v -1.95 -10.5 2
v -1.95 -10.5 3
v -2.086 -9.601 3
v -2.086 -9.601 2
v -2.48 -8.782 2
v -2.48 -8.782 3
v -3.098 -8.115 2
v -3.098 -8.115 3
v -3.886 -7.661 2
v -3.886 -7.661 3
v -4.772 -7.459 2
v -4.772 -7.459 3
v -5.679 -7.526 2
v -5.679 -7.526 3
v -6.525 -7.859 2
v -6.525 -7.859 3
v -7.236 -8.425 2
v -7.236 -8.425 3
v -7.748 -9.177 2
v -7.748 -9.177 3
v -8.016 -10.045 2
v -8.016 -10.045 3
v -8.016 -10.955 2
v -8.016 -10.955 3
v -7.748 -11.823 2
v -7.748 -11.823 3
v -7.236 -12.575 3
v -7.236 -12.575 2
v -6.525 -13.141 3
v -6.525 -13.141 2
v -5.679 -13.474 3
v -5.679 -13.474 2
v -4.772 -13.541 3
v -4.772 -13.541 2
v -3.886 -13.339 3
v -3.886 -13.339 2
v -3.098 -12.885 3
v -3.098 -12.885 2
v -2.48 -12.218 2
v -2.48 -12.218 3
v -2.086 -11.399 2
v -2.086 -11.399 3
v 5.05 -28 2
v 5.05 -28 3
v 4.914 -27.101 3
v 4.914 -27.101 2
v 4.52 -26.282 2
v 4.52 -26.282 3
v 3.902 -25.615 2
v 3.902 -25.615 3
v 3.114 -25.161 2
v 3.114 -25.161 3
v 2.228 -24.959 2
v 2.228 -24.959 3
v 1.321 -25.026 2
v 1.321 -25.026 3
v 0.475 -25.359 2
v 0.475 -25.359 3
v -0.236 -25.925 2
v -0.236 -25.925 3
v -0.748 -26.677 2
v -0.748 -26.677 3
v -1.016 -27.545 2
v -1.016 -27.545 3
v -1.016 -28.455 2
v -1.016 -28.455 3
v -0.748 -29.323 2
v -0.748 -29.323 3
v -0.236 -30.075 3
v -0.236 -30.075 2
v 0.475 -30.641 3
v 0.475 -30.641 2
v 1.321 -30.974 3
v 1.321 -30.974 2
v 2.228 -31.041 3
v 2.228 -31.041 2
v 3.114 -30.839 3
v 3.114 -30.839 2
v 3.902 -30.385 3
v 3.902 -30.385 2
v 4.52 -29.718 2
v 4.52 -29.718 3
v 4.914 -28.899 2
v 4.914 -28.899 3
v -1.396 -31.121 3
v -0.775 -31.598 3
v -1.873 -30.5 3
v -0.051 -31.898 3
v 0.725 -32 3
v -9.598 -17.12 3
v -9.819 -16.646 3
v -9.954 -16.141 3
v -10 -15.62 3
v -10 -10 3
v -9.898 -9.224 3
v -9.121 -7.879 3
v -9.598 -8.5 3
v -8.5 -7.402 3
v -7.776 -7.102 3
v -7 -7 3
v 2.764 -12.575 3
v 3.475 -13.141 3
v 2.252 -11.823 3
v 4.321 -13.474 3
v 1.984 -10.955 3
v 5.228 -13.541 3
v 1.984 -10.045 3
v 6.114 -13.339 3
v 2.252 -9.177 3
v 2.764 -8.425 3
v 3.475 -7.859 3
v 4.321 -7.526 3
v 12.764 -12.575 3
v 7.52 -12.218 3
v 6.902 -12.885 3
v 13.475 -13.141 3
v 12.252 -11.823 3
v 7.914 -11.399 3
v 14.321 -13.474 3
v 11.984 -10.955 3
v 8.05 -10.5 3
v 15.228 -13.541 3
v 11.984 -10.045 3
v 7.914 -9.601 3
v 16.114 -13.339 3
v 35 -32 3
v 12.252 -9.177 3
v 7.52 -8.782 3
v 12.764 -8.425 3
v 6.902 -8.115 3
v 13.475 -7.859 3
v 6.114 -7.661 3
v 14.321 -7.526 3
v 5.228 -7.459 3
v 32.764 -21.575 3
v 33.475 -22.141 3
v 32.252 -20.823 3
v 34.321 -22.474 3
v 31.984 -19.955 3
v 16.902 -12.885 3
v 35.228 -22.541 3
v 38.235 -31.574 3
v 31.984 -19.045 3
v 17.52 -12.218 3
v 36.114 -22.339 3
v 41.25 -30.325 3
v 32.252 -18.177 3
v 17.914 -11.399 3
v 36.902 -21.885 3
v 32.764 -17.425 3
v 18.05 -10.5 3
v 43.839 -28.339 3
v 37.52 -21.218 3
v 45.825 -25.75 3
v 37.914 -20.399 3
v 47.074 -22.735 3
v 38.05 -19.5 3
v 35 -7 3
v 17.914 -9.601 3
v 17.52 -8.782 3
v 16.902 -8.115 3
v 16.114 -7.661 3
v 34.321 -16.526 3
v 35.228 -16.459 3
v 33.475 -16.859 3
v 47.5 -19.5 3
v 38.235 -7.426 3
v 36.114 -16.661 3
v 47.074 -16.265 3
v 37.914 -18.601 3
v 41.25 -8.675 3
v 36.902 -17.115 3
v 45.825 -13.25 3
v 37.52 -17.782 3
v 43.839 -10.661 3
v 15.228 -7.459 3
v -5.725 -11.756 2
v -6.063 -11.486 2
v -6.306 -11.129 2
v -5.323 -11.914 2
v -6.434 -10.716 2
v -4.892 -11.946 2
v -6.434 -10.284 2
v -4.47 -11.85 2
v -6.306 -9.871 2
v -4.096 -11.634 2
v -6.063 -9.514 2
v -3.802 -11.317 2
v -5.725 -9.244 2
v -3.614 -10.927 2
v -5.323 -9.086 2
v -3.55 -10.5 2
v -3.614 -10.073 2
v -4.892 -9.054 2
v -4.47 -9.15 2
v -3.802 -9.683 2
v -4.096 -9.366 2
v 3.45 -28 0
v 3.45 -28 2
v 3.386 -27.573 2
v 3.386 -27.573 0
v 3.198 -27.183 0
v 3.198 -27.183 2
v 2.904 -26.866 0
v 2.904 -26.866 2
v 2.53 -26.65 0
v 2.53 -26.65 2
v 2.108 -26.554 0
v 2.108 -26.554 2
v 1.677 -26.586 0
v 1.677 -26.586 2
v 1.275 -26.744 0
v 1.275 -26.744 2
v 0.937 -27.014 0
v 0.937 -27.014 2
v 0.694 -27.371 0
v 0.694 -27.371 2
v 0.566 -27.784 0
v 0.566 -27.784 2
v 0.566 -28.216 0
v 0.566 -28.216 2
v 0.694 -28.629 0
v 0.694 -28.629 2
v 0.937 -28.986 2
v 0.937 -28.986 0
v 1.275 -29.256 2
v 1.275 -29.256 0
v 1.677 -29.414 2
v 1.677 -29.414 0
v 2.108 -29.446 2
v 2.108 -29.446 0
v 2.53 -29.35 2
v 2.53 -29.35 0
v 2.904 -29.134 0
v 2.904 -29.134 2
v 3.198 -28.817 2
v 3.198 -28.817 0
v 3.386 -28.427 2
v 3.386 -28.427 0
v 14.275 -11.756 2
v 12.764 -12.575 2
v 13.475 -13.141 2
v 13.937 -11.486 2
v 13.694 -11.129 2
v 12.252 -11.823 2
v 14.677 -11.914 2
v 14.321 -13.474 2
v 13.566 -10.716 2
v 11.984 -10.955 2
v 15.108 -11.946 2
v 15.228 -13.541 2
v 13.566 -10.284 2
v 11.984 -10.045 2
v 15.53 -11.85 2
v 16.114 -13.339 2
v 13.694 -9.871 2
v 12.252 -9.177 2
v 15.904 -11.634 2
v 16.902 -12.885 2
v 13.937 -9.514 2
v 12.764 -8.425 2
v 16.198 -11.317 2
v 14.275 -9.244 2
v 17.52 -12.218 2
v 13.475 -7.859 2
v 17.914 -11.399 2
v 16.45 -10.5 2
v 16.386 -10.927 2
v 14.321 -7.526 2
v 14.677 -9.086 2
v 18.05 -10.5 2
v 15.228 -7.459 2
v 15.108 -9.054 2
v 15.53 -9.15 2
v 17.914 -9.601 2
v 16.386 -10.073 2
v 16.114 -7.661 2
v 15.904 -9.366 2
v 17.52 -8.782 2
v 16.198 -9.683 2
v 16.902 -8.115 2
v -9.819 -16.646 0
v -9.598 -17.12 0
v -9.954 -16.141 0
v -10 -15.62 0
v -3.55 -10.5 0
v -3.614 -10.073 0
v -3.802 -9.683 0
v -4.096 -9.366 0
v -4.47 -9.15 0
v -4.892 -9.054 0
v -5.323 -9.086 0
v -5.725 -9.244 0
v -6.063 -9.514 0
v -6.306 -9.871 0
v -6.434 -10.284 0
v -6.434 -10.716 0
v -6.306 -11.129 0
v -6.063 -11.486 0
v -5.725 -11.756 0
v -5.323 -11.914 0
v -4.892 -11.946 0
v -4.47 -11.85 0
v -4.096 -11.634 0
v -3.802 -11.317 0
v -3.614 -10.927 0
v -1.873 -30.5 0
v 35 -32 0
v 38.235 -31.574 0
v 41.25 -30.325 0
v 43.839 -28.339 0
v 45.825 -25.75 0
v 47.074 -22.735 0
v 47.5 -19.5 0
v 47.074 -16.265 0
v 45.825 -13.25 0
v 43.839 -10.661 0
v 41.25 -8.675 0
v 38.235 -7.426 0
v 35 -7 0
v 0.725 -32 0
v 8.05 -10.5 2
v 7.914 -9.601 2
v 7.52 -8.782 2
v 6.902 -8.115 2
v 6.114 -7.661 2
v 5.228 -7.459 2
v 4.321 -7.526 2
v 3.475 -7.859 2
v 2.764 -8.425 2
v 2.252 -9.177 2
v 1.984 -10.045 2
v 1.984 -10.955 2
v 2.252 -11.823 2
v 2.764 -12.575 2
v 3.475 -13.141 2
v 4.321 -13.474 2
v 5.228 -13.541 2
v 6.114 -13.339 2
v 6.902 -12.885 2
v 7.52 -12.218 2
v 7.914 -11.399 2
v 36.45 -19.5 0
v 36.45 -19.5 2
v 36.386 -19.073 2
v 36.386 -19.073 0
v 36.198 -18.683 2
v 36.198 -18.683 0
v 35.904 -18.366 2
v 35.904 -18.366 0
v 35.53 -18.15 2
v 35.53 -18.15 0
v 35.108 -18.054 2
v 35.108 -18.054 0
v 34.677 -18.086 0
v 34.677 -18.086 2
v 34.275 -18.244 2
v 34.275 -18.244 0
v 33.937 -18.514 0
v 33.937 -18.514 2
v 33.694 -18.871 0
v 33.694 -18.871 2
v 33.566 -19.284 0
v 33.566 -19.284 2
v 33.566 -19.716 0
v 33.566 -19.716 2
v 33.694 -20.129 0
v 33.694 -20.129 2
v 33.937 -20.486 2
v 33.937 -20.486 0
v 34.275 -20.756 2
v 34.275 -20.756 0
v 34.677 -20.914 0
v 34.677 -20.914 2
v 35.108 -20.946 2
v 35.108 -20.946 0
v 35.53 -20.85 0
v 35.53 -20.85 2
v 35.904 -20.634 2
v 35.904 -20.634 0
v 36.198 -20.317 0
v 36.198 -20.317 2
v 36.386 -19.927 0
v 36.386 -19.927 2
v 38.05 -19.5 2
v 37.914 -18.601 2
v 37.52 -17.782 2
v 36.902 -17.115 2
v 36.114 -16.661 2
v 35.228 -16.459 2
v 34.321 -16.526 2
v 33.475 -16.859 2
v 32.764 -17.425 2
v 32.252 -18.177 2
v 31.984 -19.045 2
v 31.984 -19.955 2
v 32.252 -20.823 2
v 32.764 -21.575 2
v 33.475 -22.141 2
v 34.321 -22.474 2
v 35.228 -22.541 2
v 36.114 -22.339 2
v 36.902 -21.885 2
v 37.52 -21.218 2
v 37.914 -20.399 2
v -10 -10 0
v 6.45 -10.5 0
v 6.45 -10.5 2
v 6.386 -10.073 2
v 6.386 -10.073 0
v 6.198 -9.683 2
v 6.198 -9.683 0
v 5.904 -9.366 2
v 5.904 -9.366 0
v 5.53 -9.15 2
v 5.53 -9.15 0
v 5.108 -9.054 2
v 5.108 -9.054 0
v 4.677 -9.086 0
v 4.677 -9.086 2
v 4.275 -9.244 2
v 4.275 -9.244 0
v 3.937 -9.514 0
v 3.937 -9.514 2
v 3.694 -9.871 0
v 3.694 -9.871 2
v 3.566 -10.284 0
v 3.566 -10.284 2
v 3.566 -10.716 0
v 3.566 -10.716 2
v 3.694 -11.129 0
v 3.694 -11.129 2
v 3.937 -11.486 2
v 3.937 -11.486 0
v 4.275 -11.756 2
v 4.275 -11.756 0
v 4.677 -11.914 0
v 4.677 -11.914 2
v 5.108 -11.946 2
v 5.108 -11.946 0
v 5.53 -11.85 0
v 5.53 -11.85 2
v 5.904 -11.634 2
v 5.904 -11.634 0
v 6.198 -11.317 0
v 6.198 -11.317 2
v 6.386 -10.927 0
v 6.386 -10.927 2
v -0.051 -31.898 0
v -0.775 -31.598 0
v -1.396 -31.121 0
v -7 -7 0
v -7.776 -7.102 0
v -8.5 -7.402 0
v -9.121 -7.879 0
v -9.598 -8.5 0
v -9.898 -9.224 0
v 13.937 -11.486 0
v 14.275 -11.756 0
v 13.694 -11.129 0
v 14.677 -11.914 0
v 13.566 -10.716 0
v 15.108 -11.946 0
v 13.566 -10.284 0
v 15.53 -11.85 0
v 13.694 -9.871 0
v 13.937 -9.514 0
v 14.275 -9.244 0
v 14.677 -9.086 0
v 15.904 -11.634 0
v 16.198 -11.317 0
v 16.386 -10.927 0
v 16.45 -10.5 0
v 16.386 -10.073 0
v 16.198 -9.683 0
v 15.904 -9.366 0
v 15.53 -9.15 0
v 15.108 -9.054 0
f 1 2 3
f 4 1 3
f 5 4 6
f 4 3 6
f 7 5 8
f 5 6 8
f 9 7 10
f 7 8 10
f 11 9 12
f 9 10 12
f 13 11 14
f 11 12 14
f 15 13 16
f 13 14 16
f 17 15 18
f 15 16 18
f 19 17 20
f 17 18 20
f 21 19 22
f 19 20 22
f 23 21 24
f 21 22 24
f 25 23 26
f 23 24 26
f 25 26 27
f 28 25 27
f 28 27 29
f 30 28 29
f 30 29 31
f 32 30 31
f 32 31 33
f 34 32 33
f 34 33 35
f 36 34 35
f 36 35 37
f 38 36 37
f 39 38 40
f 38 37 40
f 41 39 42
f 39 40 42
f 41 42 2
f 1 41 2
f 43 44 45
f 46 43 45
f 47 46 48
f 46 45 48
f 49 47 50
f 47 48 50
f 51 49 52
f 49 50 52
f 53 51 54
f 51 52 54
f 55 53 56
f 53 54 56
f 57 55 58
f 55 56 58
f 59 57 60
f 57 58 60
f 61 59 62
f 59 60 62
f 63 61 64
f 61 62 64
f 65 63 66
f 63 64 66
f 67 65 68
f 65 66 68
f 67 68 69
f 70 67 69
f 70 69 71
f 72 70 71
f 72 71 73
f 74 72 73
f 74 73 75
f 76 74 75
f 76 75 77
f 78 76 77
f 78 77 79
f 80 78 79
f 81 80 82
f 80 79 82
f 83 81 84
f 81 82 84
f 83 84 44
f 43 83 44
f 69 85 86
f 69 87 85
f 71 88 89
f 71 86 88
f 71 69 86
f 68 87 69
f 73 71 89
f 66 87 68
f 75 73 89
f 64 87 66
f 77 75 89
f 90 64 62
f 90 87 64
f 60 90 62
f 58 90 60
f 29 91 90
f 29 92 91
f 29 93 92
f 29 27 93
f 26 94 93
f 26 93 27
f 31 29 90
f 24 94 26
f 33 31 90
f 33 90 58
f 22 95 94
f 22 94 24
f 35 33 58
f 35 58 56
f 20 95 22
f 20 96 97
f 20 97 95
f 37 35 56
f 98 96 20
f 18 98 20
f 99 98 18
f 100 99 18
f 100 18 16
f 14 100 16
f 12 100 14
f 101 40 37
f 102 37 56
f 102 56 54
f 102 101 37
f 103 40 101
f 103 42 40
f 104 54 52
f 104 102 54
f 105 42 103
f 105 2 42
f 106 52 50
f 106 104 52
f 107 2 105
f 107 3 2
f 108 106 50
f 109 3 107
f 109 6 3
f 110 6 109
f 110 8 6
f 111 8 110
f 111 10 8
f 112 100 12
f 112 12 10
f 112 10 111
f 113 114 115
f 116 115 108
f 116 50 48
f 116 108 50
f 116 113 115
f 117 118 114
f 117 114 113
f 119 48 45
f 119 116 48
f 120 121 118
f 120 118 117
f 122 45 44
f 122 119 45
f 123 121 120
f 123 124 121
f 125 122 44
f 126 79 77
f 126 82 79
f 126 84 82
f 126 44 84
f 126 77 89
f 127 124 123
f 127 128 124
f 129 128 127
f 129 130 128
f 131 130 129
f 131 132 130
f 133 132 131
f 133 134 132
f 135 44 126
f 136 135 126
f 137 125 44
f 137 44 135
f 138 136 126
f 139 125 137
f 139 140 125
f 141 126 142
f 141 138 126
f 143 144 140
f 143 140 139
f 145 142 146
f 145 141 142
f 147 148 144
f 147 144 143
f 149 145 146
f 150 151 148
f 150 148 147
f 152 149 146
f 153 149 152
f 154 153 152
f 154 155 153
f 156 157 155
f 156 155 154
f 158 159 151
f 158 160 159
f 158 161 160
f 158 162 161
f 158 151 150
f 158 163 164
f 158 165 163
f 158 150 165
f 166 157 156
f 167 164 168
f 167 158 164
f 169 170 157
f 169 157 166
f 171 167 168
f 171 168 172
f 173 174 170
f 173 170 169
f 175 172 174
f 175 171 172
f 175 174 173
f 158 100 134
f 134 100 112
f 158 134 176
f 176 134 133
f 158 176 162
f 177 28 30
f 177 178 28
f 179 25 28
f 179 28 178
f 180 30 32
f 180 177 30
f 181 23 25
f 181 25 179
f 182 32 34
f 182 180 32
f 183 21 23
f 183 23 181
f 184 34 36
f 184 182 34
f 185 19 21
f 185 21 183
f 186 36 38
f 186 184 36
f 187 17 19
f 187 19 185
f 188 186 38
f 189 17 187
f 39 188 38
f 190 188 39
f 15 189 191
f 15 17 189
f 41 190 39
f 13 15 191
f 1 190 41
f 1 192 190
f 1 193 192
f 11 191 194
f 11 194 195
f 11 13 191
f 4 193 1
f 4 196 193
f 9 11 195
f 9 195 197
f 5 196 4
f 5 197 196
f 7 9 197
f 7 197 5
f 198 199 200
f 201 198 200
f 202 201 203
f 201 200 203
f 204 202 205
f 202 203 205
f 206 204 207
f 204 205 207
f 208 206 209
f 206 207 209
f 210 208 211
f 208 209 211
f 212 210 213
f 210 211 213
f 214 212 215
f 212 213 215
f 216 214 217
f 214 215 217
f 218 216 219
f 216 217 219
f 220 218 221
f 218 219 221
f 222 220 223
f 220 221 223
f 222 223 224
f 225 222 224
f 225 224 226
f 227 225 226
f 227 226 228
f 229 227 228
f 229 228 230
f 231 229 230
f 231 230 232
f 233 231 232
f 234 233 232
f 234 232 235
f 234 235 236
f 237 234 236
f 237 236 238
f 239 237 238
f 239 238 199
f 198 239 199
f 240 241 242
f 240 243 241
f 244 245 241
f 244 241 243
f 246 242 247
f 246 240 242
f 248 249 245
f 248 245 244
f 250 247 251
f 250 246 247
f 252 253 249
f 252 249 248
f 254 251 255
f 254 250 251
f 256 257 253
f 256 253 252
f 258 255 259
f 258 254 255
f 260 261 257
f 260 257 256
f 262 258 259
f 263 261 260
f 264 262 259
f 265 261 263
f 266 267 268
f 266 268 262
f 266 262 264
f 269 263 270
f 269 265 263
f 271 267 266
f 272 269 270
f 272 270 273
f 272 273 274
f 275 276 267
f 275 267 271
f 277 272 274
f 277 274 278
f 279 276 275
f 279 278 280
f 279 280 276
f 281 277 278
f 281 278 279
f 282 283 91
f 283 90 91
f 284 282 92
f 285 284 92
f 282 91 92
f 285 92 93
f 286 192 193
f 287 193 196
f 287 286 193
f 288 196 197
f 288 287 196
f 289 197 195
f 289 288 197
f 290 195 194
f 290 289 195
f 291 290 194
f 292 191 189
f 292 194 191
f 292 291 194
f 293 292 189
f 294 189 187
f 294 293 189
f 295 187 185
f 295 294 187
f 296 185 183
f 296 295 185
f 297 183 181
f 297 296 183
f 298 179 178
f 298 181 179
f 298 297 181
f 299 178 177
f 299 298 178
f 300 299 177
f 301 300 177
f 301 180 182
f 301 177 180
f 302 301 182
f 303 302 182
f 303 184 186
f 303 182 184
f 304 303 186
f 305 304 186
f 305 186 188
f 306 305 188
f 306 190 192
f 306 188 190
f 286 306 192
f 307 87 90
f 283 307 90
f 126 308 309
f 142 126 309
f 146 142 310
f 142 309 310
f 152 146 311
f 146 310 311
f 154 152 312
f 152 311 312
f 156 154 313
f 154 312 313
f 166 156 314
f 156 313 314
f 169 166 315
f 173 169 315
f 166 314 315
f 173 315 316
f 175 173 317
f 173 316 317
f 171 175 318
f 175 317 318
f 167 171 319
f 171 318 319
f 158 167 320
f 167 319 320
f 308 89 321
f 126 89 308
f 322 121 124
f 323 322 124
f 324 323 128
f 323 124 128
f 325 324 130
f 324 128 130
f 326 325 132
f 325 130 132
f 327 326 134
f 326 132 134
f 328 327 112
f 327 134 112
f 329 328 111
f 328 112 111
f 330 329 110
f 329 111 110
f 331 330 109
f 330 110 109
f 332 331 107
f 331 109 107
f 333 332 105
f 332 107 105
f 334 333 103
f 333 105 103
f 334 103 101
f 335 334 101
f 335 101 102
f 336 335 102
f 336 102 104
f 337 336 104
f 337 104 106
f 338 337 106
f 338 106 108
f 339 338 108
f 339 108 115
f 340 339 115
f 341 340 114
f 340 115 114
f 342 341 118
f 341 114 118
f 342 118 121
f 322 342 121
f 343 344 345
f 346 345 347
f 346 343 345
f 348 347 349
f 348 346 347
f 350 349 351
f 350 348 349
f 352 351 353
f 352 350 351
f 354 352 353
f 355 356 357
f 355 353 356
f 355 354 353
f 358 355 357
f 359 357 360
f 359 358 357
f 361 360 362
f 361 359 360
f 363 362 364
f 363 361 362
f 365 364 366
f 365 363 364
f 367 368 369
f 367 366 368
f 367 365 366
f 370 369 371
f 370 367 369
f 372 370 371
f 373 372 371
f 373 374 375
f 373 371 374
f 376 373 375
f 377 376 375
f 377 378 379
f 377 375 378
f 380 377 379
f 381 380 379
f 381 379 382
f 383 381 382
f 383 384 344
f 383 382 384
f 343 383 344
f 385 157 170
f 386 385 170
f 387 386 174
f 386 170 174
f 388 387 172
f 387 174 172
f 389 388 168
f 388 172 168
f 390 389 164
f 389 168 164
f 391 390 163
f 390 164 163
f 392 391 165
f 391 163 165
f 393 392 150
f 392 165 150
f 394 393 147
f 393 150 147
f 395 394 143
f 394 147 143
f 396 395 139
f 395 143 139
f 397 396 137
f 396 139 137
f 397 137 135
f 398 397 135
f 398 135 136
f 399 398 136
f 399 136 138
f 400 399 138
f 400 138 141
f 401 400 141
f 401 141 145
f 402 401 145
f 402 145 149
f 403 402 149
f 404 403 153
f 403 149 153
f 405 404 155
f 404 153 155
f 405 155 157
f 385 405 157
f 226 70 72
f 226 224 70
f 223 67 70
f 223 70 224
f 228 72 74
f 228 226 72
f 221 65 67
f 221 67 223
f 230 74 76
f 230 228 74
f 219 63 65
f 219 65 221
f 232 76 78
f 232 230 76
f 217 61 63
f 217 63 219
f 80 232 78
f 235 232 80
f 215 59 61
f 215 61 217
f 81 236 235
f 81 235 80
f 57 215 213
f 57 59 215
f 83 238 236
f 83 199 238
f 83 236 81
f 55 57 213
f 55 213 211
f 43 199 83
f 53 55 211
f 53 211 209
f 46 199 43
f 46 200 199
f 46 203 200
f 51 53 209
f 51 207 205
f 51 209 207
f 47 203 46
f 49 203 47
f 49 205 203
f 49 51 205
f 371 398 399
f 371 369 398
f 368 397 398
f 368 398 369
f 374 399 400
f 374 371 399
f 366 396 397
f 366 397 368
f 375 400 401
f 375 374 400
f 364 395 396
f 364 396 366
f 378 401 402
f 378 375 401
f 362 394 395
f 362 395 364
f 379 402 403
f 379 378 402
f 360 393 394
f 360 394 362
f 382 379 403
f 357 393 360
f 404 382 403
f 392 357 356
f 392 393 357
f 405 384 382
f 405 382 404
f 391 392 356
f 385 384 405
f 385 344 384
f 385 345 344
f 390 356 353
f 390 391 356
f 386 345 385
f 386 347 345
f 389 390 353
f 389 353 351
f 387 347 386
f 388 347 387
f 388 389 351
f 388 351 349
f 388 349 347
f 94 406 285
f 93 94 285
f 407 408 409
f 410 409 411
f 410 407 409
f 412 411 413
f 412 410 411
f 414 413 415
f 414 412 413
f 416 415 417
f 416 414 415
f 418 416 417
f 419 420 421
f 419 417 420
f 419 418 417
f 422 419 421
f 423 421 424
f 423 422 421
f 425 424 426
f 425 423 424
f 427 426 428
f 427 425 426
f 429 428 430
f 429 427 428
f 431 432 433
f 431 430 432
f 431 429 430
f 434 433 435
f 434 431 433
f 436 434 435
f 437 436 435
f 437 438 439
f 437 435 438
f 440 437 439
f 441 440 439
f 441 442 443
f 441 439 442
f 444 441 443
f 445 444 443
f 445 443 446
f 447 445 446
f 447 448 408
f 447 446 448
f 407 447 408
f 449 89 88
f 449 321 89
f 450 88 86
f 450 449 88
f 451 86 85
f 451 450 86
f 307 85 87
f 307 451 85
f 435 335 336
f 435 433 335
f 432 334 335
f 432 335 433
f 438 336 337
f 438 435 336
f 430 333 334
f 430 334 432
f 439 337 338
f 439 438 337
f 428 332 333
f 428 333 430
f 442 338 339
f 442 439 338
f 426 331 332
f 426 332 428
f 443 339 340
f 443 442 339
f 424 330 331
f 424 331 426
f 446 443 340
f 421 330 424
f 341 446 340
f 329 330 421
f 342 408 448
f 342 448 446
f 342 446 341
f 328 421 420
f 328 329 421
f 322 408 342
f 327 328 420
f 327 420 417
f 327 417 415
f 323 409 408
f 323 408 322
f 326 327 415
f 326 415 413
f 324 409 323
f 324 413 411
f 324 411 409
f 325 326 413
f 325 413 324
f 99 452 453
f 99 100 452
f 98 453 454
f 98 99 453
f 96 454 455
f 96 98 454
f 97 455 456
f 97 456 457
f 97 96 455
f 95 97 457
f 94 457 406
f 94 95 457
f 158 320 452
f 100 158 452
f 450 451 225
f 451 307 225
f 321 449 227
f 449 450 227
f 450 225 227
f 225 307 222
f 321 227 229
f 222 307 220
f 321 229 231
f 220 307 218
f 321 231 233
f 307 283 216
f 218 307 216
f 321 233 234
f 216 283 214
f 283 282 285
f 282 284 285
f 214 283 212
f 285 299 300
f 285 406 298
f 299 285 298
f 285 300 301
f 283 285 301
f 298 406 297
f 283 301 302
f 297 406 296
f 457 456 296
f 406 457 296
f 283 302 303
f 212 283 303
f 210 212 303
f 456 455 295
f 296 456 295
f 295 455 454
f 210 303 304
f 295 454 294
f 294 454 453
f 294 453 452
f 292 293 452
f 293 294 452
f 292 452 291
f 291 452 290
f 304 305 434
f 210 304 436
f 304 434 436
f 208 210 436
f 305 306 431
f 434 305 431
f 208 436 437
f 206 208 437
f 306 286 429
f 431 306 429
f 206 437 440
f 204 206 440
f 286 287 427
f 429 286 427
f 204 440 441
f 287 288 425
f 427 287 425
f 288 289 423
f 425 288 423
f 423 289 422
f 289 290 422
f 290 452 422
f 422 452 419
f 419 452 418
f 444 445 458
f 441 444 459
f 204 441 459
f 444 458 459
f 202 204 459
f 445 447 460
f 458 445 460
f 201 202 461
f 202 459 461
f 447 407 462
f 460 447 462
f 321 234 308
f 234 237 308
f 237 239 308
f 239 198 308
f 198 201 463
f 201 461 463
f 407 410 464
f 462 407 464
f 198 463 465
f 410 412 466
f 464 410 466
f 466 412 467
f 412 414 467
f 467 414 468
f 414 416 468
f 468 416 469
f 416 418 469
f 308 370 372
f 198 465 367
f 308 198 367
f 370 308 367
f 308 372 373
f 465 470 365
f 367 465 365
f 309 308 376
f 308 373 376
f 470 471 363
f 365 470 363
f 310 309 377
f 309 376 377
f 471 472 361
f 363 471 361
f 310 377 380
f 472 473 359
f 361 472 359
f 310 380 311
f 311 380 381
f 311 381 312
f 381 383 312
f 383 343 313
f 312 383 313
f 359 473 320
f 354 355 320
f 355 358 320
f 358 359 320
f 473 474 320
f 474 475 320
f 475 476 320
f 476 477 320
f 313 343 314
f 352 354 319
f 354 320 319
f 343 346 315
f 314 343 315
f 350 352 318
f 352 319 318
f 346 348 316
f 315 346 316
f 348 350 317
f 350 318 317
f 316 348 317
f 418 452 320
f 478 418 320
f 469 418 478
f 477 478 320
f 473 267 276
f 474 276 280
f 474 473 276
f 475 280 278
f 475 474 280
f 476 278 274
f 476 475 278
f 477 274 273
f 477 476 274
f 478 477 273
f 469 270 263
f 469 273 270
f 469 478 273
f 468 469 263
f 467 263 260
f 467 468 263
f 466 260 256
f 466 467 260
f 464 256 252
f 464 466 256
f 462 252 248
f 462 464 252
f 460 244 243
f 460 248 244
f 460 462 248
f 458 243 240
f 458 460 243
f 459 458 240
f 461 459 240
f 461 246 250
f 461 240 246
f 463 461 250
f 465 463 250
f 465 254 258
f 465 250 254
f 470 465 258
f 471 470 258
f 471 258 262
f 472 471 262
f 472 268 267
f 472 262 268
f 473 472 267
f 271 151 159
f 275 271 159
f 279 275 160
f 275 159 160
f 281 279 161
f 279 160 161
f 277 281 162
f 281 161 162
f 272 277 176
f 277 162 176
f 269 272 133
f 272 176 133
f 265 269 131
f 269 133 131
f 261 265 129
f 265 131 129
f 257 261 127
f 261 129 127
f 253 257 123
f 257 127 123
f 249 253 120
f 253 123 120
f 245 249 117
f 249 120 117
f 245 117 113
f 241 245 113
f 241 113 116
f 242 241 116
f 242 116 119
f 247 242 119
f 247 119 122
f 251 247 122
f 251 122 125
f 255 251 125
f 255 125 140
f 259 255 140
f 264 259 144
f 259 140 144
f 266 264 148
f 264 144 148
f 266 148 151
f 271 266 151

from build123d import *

# Parameters (mm, degrees)
SKETCH_2_R          = 1.45
EXTRUDE_1_DEPTH     = 3
SKETCH_3_R          = 1.45
EXTRUDE_2_DEPTH     = 3
SKETCH_5_R          = 3.05
CUT_EXTRUDE_1_DEPTH = 1
EXTRUDE_3_DEPTH     = 3
SKETCH_7_R          = 3.05
CUT_EXTRUDE_4_DEPTH = 1
FILLET_1_R          = 3
SKETCH_10_R         = 3.05
CUT_EXTRUDE_6_DEPTH = 1


with BuildPart() as part:
    # 草图2 → 凸台-拉伸1 (new body)
    with BuildSketch(Plane.XY):
        with BuildLine():
            Line((-10, -7), (-10, -16.423561614))
            Line((-10, -16.423561614), (30.724748208, -31.24615776))
            ThreePointArc((30.724748208, -31.24615776), (47.310096913, -21.670602221), (35, -7))
            Line((35, -7), (-10, -7))
        make_face()
        with Locations((35, -19.5)):
            Circle(SKETCH_2_R, mode=Mode.SUBTRACT)
        with Locations((15, -10.5)):
            Circle(SKETCH_2_R, mode=Mode.SUBTRACT)
        with Locations((5, -10.5)):
            Circle(SKETCH_2_R, mode=Mode.SUBTRACT)
        with Locations((-5, -10.5)):
            Circle(SKETCH_2_R, mode=Mode.SUBTRACT)
    extrude(amount=EXTRUDE_1_DEPTH)

    # 草图3 → 凸台-拉伸2 (add)
    with BuildSketch(Plane.XY.offset(3)):
        Polygon((-10, -16.423561614), (32.795912741, -32), (-1.006939105, -32), align=None)
        with Locations((2, -28)):
            Circle(SKETCH_3_R, mode=Mode.SUBTRACT)
    extrude(amount=-EXTRUDE_2_DEPTH)

    # 草图5 → 切除-拉伸1 (cut)
    with BuildSketch(Plane.XY.offset(3)):
        with Locations((-5, -10.5)):
            Circle(SKETCH_5_R)
        with Locations((5, -10.5)):
            Circle(SKETCH_5_R)
        with Locations((15, -10.5)):
            Circle(SKETCH_5_R)
    extrude(amount=-CUT_EXTRUDE_1_DEPTH, mode=Mode.SUBTRACT)

    # 草图8 → 凸台-拉伸3 (add)
    with BuildSketch(Plane.XY.offset(3)):
        Polygon((32.795912741, -32), (35, -32), (30.724748208, -31.24615776), align=None)
    extrude(amount=-EXTRUDE_3_DEPTH)

    # 草图7 → 切除-拉伸4 (cut)
    with BuildSketch(Plane.XY.offset(3)):
        with Locations((2, -28)):
            Circle(SKETCH_7_R)
    extrude(amount=-CUT_EXTRUDE_4_DEPTH, mode=Mode.SUBTRACT)

    # 圆角1
    fillet_1_edges = [part.edges().sort_by_distance(p)[0] for p in [
        (-1.006939105, -32, 1.5),
        (-10, -16.423561614, 1.5),
        (-10, -7, 1.5),
    ]]
    fillet(fillet_1_edges, radius=FILLET_1_R)

    # 草图10 → 切除-拉伸6 (cut)
    with BuildSketch(Plane.XY.offset(3)):
        with Locations((35, -19.5)):
            Circle(SKETCH_10_R)
    extrude(amount=-CUT_EXTRUDE_6_DEPTH, mode=Mode.SUBTRACT)


solid = part.part
